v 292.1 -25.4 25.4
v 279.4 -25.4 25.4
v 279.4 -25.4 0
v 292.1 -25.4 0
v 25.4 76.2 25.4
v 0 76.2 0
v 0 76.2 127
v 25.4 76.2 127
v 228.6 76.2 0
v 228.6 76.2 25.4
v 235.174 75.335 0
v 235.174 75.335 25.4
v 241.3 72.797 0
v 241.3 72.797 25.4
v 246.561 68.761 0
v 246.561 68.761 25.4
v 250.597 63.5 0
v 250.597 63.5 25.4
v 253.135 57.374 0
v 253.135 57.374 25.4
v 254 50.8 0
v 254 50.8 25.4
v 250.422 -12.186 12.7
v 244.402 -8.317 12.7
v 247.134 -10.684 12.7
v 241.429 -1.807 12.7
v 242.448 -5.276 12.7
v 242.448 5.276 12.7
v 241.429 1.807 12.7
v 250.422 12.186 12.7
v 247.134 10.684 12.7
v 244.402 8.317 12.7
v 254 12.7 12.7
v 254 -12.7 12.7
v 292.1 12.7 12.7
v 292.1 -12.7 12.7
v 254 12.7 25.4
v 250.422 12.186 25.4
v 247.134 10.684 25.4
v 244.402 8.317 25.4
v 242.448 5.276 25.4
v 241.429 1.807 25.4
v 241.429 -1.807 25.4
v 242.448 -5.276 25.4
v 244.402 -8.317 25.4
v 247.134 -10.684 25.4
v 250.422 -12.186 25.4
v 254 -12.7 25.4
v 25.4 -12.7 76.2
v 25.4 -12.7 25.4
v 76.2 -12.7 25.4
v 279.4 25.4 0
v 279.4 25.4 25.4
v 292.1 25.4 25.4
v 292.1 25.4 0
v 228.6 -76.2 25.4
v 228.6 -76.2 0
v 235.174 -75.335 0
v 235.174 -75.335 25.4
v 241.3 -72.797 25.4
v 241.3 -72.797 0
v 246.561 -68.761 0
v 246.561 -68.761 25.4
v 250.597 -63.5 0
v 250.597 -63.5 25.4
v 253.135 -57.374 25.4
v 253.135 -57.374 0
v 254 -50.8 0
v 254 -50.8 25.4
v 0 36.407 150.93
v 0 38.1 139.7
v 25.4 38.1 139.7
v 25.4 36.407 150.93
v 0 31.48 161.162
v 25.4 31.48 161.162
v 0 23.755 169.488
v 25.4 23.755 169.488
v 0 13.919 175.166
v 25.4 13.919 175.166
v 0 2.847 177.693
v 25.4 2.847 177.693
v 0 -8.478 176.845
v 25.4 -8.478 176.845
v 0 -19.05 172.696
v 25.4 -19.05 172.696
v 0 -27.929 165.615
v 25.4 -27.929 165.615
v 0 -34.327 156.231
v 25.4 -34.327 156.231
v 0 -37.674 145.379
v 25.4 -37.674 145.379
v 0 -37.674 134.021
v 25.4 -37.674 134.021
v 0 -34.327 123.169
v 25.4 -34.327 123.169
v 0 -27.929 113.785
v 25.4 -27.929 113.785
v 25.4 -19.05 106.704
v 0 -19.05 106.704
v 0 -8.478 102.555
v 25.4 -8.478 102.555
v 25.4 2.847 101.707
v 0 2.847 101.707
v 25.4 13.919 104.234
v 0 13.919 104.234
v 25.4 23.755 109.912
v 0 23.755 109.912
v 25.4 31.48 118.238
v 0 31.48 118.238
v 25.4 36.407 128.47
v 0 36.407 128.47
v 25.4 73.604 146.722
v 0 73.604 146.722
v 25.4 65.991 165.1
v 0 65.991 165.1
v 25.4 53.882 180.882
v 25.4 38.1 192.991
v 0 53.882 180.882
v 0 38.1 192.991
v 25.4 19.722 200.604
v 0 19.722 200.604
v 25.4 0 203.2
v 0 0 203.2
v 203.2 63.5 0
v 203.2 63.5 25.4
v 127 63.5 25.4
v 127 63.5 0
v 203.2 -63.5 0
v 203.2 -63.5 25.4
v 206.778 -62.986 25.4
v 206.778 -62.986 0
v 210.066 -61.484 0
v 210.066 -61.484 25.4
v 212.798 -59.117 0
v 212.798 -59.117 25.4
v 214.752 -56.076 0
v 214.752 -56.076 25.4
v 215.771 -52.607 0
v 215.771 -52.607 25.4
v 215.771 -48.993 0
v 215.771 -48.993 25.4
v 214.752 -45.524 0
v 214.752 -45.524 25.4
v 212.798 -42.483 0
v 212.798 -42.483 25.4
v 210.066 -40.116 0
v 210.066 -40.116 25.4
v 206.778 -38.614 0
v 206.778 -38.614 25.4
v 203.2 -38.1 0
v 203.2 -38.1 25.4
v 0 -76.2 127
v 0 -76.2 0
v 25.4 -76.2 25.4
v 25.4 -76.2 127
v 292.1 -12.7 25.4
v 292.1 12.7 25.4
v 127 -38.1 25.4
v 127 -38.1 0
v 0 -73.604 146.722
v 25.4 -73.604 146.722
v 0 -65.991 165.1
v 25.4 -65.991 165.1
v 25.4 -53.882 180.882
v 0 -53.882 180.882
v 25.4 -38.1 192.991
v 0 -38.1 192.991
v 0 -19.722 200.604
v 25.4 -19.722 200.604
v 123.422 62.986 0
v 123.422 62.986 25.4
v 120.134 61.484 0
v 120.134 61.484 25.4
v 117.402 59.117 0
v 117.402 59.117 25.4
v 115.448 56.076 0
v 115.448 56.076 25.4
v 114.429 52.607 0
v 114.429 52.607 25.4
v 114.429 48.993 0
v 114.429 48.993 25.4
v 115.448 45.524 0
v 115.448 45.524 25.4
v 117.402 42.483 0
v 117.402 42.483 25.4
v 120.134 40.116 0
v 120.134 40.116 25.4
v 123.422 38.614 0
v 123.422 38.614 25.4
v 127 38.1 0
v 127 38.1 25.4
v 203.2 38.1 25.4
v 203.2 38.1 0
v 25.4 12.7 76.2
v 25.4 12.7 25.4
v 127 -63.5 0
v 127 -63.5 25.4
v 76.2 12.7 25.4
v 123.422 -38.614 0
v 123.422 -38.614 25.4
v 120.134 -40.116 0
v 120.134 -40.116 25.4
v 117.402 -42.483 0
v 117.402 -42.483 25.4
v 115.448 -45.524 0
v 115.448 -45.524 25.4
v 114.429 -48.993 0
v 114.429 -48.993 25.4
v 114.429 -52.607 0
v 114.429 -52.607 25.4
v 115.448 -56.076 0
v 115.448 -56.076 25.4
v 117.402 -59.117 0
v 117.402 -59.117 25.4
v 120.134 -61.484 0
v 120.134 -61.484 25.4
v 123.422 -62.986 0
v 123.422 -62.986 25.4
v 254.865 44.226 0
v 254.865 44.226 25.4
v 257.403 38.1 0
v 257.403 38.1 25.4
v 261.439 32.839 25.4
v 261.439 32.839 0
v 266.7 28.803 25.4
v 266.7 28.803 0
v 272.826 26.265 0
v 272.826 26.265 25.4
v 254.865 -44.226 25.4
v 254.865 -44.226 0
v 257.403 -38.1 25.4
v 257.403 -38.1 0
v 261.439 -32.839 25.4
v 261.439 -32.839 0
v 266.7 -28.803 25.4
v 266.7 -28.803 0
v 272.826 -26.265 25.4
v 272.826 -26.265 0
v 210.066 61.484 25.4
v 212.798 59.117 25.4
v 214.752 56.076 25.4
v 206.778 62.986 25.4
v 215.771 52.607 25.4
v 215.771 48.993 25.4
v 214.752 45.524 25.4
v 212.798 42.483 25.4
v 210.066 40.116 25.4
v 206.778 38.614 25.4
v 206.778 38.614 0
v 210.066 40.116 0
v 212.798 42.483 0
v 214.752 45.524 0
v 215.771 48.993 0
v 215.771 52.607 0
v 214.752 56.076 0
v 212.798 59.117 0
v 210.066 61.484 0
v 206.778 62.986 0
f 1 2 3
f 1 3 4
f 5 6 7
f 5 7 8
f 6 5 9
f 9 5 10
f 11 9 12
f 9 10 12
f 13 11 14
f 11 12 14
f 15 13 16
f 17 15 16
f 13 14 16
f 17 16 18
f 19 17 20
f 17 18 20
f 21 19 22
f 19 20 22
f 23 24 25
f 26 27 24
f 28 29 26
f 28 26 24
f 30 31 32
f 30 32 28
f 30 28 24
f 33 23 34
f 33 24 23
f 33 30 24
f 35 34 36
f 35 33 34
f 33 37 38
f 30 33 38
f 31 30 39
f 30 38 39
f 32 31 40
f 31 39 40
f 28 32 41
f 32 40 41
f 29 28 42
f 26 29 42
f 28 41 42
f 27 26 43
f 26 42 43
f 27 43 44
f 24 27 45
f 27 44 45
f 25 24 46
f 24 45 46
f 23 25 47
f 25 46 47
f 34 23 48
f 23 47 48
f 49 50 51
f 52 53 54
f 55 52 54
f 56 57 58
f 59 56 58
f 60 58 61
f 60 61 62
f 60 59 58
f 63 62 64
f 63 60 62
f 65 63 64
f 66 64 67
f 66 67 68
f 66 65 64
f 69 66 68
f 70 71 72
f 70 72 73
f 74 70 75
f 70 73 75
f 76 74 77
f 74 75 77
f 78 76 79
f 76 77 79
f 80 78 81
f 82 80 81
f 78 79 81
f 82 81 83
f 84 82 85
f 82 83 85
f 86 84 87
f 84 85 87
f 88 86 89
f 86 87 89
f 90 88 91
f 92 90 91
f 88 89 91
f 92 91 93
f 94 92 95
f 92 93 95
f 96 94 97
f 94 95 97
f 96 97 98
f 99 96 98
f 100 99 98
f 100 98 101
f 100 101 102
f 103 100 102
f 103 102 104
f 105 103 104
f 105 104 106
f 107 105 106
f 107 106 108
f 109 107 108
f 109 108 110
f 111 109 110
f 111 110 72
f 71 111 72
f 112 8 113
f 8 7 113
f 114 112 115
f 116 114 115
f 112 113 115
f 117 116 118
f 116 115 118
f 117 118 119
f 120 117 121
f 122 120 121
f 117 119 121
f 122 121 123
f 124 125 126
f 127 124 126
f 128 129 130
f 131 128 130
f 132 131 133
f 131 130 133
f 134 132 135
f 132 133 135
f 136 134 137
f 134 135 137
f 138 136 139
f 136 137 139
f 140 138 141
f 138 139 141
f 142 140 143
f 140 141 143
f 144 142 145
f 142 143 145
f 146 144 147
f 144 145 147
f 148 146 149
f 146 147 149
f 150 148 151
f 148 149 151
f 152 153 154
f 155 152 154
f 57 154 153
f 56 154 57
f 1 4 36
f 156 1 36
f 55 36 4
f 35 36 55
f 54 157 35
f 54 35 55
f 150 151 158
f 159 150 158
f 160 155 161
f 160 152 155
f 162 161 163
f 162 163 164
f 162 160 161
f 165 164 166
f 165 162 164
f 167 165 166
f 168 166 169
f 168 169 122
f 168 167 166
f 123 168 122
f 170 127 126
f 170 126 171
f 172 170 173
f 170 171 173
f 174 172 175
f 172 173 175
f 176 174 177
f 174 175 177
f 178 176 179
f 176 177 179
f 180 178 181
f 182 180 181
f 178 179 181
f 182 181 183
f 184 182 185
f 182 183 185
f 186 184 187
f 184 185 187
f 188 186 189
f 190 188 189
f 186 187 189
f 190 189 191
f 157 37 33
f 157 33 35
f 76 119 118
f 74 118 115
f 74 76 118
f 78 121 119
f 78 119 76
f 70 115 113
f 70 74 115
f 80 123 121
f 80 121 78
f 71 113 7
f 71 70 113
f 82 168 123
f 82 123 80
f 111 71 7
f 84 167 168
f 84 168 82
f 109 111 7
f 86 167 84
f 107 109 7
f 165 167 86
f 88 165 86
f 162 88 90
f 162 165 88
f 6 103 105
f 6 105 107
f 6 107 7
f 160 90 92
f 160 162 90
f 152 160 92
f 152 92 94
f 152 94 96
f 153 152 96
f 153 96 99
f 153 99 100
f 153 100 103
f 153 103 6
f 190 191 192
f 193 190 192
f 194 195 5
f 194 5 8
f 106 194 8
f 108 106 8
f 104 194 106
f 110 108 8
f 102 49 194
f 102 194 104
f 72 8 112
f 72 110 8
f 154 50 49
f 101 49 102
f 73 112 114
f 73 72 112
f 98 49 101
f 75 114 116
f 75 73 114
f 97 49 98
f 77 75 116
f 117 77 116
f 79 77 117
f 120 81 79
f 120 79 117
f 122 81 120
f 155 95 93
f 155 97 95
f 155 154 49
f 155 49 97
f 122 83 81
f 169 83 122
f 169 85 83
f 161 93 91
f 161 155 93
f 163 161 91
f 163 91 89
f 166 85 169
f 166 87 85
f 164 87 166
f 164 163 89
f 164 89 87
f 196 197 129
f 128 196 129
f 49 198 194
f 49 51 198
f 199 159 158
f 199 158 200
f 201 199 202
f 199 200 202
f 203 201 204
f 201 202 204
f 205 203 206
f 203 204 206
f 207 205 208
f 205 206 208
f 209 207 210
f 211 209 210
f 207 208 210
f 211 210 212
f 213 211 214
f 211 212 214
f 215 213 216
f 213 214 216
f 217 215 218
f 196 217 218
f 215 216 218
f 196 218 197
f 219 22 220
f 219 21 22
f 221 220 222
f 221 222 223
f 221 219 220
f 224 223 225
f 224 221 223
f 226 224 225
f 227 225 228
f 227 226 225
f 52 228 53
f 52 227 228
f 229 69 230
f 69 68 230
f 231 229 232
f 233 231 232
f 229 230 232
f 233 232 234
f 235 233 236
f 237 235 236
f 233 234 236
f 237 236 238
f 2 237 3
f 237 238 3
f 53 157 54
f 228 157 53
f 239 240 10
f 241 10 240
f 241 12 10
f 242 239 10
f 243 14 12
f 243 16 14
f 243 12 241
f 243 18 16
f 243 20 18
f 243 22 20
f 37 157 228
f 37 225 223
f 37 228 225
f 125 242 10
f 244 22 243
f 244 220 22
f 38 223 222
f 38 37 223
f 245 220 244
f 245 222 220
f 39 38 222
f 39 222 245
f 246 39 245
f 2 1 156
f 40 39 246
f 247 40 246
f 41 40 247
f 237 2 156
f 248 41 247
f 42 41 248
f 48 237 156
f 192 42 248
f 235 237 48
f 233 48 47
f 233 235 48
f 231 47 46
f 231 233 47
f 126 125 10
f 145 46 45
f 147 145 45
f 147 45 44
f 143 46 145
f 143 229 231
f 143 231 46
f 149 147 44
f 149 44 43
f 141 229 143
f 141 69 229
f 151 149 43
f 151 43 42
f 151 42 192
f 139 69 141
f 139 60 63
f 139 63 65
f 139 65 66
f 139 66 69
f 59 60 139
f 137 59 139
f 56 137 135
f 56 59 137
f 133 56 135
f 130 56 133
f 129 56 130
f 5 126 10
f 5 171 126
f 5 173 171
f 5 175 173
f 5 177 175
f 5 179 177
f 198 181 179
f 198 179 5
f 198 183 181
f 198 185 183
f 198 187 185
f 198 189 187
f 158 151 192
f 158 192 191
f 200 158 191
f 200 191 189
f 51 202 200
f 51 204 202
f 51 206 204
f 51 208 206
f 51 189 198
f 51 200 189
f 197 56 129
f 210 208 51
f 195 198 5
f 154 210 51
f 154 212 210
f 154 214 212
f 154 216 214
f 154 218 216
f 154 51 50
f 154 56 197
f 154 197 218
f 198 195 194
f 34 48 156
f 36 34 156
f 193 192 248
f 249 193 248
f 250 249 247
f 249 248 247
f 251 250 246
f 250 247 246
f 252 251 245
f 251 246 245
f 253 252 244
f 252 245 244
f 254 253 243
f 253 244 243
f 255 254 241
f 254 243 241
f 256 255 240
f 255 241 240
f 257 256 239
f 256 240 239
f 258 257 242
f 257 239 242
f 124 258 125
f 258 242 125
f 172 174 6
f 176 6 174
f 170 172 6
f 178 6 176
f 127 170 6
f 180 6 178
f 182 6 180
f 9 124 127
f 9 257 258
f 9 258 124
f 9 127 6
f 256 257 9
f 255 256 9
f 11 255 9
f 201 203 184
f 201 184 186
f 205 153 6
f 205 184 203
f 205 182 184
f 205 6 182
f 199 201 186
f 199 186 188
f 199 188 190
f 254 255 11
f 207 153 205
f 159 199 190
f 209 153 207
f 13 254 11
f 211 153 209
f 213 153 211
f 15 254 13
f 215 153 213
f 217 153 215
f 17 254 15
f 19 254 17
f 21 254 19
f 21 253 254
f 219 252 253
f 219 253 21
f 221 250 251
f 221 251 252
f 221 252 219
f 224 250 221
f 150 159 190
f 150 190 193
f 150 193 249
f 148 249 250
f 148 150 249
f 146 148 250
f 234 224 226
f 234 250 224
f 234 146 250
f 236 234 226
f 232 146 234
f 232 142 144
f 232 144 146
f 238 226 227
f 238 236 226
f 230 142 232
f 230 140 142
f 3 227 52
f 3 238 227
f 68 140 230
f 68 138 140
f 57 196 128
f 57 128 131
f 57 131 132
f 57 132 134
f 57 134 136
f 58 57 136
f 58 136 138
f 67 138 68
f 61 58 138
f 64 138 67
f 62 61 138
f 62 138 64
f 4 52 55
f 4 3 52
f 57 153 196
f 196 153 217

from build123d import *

# Parameters (mm, degrees)
F1_DEPTH  = 76.2
F2_DEPTH  = 12.7
F3_R      = 76.19999
F6_DEPTH  = 25.401
F7_DEPTH  = 25.401
F5_W      = 38.1
F5_H      = 12.7
F5_H_2    = 25.4
F8_DEPTH  = 25.4
F9_R      = 25.4
F10_R     = 25.39999
F11_DEPTH = 12.7


# Not quite as in the source:
# - a fillet or chamfer is up to 0.001 mm smaller than in the source, because OpenCascade refuses the exact size
# - a feature names something its author has since deleted; it is built from what else it names


with BuildPart() as f1:
    # F0 (on Front) → F1 (new body, symmetric)
    with BuildSketch(Plane.XZ):
        Polygon((0, 203.2), (0, 0), (254, 0), (254, 25.4), (76.2, 25.4), (25.4, 25.4), (25.4, 76.2), (25.4, 203.2), align=None)
    extrude(amount=F1_DEPTH, both=True)

    # F0 (on Front) → F2 (join, symmetric)
    with BuildSketch(Plane.XZ):
        Polygon((76.2, 25.4), (25.4, 76.2), (25.4, 25.4), align=None)
    extrude(amount=F2_DEPTH, both=True)

    # F3 (radius 76.2 in the source; OpenCascade refuses exactly that, so slightly less here)
    f3_edges = [f1.edges().sort_by_distance(p)[0] for p in [
        (12.7, -76.2, 203.2),
        (12.7, 76.2, 203.2),
    ]]
    fillet(f3_edges, radius=F3_R)

    # F5 (on face) → F6 (cut, through all)
    with BuildSketch(Plane.XY.offset(25.4)):
        with BuildLine():
            Line((203.2, 63.5), (127, 63.5))
            ThreePointArc((127, 63.5), (114.3, 50.8), (127, 38.1))
            Line((127, 38.1), (203.2, 38.1))
            ThreePointArc((203.2, 38.1), (215.9, 50.8), (203.2, 63.5))
        make_face()
        with BuildLine():
            Line((203.2, -38.1), (127, -38.1))
            ThreePointArc((127, -38.1), (114.3, -50.8), (127, -63.5))
            Line((127, -63.5), (203.2, -63.5))
            ThreePointArc((203.2, -63.5), (215.9, -50.8), (203.2, -38.1))
        make_face()
    extrude(amount=-F6_DEPTH, mode=Mode.SUBTRACT)

    # F4 (on face) → F7 (cut, through all)
    with BuildSketch(Plane.YZ.offset(25.4)):
        with BuildLine():
            Line((0, 101.6), (0, 177.8))
            ThreePointArc((0, 177.8), (-38.1, 139.7), (0, 101.6))
        make_face()
        with BuildLine():
            ThreePointArc((0, 101.6), (26.9407683632, 112.7592316368), (38.1, 139.7))
            ThreePointArc((38.1, 139.7), (26.9407683632, 166.6407683632), (0, 177.8))
            Line((0, 177.8), (0, 101.6))
        make_face()
    extrude(amount=-F7_DEPTH, mode=Mode.SUBTRACT)

    # F5 (on face) → F8 (join)
    with BuildSketch(Plane.XY.offset(25.4)):
        with Locations((273.05, 19.05)):
            Rectangle(F5_W, F5_H)
        with Locations((273.05, -19.05)):
            Rectangle(F5_W, F5_H)
        with Locations((273.05, 0)):
            Rectangle(F5_W, F5_H_2)
    extrude(amount=-F8_DEPTH)

    # F9
    f9_edges = [f1.edges().sort_by_distance(p)[0] for p in [
        (254, 76.2, 12.7),
        (254, -76.2, 12.7),
    ]]
    fillet(f9_edges, radius=F9_R)

    # F10 (radius 25.4 in the source; OpenCascade refuses exactly that, so slightly less here)
    f10_edges = [f1.edges().sort_by_distance(p)[0] for p in [
        (254, 25.4, 12.7),
        (254, -25.4, 12.7),
    ]]
    fillet(f10_edges, radius=F10_R)

    # F5 (on face) → F11 (cut)
    with BuildSketch(Plane.XY.offset(25.4)):
        with BuildLine():
            Line((254, -12.7), (254, 12.7))
            ThreePointArc((254, 12.7), (241.3, 0), (254, -12.7))
        make_face()
        with Locations((273.05, 0)):
            Rectangle(F5_W, F5_H_2)
    extrude(amount=-F11_DEPTH, mode=Mode.SUBTRACT)


solid = f1.part
